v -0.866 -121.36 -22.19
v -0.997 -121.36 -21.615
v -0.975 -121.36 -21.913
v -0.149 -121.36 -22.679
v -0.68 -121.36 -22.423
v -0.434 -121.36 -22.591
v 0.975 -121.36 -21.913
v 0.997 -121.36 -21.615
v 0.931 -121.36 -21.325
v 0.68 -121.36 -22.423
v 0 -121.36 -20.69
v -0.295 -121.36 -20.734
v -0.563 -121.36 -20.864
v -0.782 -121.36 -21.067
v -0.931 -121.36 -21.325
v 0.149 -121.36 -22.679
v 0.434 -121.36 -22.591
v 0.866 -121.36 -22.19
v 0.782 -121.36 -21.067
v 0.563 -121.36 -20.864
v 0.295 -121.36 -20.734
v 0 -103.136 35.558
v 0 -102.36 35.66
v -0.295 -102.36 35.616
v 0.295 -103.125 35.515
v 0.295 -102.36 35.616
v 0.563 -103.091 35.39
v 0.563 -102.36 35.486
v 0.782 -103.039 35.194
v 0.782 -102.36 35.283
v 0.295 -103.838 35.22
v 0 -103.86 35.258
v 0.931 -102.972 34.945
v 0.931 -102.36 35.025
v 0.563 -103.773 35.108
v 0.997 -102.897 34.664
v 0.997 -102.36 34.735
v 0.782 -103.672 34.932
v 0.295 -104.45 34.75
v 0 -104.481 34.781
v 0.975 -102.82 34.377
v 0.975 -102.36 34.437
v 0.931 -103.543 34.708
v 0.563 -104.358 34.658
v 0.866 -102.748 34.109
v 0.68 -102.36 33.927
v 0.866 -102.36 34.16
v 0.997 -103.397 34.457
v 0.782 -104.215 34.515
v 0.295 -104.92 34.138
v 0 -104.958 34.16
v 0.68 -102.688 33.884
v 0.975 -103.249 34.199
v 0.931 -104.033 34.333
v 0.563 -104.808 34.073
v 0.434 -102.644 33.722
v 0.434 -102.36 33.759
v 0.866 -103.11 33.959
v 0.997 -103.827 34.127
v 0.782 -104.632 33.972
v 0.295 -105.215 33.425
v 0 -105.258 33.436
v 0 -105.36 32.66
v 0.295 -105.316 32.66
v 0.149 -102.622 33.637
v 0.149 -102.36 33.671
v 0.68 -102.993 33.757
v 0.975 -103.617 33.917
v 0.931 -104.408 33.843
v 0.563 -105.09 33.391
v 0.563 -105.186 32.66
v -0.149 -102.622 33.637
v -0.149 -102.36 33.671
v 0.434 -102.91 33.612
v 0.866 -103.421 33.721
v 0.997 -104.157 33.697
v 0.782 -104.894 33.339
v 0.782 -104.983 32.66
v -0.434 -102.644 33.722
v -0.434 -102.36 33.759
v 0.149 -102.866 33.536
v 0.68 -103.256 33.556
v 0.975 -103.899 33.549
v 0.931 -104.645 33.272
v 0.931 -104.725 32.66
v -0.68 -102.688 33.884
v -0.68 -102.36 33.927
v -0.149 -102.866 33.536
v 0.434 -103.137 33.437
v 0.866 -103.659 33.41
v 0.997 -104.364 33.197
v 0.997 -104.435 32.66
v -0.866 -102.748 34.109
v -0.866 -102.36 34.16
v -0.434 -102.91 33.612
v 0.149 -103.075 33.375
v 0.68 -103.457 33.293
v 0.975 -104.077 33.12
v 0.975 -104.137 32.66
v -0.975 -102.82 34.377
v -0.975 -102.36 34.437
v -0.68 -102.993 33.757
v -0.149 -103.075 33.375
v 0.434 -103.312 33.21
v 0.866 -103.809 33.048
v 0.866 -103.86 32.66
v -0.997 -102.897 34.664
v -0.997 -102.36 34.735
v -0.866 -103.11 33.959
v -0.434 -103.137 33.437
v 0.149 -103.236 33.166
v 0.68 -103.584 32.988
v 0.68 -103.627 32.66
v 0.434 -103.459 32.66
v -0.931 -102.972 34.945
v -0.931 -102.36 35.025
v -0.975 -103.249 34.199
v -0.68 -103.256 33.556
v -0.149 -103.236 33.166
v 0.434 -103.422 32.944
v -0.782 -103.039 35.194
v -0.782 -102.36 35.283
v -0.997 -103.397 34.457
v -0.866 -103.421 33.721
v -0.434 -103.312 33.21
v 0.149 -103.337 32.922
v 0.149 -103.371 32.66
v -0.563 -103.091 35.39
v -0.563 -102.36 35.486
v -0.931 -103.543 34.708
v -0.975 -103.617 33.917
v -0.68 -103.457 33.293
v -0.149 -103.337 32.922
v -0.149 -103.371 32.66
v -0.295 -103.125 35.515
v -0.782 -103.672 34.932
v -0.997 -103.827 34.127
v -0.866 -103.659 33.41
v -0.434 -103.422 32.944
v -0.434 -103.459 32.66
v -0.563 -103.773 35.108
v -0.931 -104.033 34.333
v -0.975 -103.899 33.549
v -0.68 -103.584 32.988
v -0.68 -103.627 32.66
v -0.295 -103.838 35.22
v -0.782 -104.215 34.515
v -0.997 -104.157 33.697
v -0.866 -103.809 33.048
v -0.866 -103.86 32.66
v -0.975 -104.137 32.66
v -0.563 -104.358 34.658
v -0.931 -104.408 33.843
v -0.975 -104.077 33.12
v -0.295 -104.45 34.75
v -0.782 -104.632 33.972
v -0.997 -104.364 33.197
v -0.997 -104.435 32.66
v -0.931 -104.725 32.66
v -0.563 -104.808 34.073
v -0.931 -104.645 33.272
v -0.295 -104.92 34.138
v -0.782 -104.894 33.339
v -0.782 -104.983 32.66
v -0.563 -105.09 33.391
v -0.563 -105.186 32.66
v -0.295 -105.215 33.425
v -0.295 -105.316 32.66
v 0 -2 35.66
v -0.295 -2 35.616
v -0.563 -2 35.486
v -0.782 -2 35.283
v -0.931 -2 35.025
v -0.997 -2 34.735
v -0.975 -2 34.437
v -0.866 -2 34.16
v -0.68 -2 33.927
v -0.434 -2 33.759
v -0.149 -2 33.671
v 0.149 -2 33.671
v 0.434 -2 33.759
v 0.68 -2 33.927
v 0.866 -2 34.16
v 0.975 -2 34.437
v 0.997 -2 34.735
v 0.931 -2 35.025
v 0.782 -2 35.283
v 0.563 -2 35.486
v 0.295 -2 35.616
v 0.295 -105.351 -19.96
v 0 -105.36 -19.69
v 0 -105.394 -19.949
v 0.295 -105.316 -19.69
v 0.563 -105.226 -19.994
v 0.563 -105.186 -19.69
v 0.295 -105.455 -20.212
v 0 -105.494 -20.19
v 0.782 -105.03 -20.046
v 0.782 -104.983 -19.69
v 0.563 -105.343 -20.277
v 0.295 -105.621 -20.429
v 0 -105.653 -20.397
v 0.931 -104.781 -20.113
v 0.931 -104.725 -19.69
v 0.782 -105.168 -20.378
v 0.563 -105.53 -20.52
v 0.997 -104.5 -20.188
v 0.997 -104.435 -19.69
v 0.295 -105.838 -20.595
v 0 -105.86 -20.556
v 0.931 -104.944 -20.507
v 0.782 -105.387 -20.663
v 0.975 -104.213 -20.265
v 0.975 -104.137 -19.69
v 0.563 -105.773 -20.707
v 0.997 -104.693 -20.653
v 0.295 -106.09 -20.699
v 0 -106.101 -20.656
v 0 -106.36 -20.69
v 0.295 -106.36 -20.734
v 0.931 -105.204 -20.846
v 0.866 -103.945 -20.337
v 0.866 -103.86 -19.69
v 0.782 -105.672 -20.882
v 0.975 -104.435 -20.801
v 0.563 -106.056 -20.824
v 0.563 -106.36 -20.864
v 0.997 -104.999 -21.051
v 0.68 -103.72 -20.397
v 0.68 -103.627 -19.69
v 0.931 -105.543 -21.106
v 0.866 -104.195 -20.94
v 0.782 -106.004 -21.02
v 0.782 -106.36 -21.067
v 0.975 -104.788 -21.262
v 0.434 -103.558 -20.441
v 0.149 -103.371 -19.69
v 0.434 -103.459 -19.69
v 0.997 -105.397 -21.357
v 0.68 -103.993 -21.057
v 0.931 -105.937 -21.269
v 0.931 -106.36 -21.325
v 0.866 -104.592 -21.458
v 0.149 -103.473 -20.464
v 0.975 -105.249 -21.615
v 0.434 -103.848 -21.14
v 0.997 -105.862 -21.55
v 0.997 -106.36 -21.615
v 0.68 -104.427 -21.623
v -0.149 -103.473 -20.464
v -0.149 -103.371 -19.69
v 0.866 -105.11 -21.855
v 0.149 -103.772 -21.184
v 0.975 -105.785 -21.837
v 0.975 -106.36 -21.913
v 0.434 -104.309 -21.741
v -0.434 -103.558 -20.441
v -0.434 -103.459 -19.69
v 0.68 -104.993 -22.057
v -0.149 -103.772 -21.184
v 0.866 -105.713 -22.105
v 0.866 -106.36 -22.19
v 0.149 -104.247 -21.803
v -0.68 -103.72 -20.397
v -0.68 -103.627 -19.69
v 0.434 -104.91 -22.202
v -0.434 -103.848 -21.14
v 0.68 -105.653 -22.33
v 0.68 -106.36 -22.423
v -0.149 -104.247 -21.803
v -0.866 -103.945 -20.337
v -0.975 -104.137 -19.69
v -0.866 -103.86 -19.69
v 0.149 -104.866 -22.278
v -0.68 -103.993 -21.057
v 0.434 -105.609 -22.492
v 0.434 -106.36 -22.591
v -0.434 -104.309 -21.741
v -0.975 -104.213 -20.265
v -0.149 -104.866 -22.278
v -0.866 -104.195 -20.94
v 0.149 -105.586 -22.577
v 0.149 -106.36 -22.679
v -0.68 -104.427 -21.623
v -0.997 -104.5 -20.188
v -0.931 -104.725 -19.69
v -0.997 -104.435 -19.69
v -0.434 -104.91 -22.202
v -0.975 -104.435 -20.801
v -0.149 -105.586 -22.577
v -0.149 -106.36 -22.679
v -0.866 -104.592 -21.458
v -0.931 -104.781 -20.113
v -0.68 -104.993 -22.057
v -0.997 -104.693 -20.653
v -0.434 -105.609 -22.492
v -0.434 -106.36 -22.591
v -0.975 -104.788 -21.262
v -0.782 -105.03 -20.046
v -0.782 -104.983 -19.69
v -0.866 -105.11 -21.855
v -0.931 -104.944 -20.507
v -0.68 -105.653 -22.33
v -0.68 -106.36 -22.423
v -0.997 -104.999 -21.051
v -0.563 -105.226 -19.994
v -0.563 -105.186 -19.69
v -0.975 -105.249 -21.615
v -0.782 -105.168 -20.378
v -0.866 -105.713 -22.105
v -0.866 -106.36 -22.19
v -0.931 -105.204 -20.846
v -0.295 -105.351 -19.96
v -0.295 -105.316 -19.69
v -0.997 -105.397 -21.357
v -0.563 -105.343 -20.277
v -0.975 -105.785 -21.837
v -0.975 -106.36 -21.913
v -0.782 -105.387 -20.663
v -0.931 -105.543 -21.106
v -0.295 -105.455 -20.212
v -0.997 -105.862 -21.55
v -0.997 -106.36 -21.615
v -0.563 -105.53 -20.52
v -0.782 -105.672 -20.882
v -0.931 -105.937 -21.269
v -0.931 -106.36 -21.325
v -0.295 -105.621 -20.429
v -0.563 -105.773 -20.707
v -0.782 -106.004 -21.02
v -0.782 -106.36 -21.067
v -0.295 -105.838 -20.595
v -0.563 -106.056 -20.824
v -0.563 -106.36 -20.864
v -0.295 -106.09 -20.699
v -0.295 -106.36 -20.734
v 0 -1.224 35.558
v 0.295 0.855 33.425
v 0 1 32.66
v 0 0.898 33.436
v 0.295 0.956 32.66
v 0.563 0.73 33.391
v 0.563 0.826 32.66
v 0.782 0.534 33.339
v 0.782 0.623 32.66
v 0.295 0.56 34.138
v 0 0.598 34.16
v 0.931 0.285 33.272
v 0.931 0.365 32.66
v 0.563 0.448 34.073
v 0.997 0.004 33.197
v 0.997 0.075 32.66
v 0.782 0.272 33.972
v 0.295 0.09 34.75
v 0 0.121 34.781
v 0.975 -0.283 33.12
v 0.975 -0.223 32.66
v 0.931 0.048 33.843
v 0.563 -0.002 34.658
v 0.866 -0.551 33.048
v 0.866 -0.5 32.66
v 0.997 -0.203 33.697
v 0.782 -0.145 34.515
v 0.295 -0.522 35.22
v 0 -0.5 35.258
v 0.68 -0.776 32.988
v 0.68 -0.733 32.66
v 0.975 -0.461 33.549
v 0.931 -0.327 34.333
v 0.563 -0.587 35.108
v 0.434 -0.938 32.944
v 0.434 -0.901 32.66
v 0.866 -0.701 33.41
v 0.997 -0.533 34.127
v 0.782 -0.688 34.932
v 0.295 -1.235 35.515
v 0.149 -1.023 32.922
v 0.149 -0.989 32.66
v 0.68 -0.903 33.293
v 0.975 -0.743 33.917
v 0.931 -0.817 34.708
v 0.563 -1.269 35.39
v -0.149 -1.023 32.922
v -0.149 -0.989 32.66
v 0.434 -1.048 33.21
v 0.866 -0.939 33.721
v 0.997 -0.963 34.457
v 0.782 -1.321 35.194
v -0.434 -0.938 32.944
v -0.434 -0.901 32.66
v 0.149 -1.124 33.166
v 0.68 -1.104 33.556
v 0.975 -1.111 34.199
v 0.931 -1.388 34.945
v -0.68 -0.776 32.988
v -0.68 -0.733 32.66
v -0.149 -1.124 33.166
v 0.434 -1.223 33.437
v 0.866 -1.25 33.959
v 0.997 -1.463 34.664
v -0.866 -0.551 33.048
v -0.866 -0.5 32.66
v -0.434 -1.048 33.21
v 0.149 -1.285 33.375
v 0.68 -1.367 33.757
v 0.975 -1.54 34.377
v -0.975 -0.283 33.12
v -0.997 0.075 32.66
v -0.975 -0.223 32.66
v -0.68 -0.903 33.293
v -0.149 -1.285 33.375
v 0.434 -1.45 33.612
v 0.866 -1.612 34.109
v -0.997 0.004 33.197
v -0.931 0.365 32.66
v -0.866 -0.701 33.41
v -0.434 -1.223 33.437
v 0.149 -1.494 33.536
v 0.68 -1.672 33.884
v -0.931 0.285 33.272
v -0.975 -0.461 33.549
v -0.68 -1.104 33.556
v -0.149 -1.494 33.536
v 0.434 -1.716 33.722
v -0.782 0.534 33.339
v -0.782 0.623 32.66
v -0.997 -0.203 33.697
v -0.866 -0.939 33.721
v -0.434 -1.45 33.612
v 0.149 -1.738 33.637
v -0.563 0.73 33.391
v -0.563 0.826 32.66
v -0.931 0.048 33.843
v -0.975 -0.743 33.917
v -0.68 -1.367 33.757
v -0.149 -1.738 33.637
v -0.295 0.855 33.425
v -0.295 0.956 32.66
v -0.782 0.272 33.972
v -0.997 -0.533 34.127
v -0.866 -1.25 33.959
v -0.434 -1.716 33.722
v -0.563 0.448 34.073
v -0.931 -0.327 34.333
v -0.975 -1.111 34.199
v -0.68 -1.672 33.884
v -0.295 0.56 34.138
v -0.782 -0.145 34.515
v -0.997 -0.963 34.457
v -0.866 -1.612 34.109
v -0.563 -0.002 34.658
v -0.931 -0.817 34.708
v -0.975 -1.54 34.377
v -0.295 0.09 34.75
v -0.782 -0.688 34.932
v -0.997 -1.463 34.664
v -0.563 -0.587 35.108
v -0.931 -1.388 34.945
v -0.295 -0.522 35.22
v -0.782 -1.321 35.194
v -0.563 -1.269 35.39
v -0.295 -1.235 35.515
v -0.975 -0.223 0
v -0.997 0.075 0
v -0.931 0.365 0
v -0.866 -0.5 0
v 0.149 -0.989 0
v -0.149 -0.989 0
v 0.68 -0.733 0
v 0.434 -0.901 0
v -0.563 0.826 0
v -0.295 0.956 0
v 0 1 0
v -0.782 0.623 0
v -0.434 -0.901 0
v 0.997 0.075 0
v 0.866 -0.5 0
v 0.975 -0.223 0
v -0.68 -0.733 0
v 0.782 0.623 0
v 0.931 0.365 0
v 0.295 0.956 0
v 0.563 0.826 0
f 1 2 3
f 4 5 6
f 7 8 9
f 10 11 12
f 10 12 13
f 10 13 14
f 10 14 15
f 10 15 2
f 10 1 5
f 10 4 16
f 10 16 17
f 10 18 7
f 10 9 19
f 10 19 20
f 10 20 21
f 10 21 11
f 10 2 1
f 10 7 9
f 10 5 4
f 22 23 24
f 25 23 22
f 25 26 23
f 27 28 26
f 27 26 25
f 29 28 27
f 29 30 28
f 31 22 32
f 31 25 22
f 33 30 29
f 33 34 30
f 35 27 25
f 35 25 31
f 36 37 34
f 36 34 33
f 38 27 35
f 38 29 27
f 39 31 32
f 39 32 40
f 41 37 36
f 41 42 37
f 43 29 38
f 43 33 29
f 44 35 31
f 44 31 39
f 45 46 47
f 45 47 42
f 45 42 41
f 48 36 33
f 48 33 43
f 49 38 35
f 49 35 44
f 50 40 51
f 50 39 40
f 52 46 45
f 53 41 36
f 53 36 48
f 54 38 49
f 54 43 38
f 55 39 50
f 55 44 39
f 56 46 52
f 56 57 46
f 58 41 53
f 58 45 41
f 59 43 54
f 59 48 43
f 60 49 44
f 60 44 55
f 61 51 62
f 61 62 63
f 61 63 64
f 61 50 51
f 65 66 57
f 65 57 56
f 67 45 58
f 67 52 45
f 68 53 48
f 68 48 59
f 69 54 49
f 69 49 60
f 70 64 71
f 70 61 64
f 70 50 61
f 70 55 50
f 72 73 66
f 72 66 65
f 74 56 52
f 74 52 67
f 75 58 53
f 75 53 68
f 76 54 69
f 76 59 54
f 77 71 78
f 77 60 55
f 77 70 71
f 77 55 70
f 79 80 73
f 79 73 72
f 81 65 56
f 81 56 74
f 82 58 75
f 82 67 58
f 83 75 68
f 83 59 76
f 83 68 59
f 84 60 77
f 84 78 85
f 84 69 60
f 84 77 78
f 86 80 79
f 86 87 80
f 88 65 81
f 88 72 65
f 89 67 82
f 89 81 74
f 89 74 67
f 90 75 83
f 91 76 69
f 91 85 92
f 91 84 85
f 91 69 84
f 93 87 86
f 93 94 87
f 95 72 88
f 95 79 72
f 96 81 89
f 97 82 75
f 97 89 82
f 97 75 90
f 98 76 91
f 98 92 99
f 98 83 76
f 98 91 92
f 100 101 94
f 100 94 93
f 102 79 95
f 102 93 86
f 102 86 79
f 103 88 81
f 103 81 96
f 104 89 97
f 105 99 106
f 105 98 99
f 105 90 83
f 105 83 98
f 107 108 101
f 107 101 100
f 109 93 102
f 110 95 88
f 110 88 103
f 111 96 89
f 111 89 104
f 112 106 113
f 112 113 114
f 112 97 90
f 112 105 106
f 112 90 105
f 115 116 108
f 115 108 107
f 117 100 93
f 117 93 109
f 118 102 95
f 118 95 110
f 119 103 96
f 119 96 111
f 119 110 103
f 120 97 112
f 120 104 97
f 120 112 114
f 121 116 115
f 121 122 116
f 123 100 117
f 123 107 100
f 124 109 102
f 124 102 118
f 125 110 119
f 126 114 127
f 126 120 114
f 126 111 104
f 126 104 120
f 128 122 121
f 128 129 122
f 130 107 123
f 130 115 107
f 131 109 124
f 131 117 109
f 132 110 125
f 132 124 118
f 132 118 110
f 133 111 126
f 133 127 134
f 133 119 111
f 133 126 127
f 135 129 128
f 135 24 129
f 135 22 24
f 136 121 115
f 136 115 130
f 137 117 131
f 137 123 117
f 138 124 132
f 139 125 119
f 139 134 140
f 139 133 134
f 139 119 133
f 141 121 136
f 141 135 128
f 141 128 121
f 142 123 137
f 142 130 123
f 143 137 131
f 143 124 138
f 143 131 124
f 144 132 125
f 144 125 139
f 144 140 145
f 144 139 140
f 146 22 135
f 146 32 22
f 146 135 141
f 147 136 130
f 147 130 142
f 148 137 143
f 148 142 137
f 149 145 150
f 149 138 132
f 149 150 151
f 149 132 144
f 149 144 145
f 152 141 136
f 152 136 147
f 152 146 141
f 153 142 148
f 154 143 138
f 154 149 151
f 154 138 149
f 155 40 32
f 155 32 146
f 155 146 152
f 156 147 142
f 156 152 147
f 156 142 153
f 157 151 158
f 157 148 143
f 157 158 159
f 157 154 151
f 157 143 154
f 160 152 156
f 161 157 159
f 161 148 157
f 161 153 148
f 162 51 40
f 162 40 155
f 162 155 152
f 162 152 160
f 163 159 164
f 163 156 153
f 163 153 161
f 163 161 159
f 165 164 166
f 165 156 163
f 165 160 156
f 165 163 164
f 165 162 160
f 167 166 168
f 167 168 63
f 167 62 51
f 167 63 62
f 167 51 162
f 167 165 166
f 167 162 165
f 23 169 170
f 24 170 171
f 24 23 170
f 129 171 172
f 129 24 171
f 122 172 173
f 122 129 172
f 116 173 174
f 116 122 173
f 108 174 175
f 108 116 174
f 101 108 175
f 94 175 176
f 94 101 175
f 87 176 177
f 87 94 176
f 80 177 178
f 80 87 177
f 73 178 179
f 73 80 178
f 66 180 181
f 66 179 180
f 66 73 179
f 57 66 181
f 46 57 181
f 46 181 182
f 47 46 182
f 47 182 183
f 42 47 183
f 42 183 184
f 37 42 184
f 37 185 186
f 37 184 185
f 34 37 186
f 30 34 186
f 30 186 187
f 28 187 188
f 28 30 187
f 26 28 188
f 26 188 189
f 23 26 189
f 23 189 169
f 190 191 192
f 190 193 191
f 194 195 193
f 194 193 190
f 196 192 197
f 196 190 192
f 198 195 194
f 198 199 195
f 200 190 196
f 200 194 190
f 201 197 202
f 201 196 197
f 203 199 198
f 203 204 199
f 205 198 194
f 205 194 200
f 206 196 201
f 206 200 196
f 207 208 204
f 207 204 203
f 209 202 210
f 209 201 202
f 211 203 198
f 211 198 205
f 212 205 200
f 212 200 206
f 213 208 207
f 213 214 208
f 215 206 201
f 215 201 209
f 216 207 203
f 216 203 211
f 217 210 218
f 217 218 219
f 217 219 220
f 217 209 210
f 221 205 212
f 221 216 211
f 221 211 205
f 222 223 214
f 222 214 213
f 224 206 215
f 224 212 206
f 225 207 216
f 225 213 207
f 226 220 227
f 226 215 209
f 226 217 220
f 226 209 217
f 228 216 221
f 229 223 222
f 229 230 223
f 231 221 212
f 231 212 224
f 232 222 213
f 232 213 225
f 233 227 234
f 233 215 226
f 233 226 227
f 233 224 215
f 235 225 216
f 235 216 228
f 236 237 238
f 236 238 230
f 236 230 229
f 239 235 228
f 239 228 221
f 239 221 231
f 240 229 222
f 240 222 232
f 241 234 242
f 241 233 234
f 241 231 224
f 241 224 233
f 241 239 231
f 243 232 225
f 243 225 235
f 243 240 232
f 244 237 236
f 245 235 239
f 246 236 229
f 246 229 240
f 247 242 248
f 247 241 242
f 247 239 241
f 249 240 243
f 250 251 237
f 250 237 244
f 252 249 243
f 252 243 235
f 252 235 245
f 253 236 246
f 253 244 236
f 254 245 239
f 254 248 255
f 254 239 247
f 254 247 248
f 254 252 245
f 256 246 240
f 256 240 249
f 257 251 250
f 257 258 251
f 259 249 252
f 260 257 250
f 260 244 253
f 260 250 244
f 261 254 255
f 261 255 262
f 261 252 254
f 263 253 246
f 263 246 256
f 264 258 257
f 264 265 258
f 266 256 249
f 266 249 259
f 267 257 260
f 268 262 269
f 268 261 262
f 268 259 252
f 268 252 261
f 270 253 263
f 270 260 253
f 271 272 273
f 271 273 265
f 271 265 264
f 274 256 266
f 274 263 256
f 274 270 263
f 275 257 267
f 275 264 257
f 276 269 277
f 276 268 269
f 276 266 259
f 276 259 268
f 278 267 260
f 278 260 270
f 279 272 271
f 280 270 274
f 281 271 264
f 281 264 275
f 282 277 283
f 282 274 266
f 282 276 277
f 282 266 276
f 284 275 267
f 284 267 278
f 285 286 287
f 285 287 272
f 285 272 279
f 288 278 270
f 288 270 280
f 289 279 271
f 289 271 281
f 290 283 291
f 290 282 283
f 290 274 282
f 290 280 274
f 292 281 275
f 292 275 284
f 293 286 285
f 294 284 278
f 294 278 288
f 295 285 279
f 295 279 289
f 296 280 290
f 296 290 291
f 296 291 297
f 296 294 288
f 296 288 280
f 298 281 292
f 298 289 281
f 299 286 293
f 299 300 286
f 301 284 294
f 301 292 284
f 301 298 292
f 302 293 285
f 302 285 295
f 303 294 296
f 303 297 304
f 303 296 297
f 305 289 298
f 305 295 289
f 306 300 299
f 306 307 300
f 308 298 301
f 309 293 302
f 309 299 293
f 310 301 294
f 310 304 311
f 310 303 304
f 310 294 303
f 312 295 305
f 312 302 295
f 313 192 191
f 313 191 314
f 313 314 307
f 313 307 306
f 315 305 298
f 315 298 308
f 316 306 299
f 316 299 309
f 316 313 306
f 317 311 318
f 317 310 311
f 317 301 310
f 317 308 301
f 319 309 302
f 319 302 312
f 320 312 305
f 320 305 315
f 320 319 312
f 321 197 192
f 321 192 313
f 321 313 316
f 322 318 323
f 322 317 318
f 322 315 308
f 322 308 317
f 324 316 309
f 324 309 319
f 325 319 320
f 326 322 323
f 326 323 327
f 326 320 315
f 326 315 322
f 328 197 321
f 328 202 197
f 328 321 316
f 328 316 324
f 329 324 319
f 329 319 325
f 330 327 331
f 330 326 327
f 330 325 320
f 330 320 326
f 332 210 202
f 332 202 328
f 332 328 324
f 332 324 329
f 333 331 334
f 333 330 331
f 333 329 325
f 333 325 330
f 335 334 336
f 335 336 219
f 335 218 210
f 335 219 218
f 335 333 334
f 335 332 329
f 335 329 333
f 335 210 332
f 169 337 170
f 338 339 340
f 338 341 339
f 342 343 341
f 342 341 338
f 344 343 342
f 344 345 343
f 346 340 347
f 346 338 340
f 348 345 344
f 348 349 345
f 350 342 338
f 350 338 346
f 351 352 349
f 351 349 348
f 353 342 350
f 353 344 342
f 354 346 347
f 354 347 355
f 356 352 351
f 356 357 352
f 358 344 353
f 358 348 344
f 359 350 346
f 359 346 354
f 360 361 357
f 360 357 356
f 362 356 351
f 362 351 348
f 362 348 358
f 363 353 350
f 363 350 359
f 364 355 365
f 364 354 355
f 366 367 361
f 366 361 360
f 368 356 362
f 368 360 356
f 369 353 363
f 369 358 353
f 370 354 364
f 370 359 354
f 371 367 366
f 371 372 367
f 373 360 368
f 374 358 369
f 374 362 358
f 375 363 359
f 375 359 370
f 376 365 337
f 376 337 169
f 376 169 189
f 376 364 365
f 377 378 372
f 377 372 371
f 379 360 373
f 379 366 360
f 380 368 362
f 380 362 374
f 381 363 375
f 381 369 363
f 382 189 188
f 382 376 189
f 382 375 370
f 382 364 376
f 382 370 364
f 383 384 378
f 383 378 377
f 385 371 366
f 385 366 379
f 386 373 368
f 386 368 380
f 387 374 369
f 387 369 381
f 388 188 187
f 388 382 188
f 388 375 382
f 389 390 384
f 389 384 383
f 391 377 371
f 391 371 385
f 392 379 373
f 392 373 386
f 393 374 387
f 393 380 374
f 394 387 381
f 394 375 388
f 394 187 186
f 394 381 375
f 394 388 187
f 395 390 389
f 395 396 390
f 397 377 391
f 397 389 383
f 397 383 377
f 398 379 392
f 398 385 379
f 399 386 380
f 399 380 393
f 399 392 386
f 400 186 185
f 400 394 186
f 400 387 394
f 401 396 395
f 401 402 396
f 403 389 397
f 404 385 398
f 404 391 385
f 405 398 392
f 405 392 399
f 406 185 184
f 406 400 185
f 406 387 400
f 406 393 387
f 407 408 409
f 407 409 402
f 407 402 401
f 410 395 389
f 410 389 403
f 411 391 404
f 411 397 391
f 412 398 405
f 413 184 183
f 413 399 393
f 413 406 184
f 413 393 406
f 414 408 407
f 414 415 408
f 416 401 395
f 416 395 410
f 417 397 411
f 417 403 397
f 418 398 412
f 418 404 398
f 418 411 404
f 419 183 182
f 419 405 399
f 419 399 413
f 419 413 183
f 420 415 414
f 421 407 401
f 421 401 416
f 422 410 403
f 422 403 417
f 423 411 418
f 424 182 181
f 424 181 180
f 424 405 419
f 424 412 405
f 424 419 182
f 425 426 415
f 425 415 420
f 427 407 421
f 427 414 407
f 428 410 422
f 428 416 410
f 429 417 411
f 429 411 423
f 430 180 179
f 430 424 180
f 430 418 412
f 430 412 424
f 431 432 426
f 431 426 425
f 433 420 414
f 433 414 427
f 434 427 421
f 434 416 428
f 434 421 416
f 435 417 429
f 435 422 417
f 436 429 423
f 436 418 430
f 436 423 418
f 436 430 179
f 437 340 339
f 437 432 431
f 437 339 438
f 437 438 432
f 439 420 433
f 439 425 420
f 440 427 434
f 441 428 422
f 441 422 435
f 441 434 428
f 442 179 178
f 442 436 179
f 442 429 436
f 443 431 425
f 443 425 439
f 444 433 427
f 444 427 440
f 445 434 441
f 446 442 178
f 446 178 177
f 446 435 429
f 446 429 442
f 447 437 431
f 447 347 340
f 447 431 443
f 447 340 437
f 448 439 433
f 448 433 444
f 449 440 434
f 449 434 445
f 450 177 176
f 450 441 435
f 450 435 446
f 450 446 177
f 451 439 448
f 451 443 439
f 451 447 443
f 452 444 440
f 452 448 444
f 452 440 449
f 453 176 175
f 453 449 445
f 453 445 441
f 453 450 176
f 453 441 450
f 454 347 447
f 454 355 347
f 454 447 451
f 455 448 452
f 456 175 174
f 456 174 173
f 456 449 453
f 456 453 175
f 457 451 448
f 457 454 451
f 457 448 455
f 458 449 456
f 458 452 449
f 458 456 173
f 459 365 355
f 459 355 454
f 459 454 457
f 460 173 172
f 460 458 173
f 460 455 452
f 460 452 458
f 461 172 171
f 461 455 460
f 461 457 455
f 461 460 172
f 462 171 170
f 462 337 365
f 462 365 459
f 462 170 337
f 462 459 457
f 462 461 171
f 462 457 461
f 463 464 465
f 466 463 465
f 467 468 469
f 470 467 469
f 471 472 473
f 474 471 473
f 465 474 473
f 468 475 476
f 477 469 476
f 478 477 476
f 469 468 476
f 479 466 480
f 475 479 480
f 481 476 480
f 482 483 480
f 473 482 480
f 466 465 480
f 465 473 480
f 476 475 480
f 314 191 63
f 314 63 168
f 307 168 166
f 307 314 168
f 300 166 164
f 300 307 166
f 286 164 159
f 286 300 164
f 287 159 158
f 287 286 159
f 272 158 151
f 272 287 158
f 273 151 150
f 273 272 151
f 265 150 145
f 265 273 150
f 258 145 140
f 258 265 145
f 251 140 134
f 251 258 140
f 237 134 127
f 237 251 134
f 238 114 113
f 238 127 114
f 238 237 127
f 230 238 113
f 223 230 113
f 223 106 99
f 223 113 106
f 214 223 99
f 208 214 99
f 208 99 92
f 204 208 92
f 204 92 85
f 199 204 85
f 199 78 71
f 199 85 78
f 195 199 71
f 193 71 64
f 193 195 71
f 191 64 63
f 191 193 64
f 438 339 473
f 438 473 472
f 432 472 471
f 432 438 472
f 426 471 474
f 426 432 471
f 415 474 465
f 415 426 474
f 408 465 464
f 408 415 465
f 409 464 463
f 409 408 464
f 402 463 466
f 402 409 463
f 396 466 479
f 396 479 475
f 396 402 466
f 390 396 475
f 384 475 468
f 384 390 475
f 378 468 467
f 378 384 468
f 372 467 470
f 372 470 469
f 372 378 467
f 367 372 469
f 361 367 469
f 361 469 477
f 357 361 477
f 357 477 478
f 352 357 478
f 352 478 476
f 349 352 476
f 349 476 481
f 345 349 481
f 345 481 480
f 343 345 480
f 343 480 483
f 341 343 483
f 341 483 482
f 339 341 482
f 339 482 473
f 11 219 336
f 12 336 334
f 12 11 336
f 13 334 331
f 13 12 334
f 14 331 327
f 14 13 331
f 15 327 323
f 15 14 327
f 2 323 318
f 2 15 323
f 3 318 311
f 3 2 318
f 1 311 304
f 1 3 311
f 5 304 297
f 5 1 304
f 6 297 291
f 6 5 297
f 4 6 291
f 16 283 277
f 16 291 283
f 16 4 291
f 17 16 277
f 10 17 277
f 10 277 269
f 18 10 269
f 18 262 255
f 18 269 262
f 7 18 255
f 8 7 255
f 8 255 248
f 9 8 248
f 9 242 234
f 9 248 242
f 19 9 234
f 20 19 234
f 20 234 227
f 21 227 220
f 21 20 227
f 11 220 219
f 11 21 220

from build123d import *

# Parameters (mm, degrees)
BARRER1_PROFILE_R = 1


with BuildPart() as part:
    # Barrer1: sweep along a path in Croquis1
    with BuildLine(Plane(origin=(0, 0, 0), x_dir=(0, 0, -1), z_dir=(1, 0, 0))) as barrer1_path:
        Line((0, 0), (-32.66, 0))
        ThreePointArc((-32.66, 0), (-34.074213562, -0.585786438), (-34.66, -2))
        Line((-34.66, -2), (-34.66, -102.36))
        ThreePointArc((-34.66, -102.36), (-34.074213562, -103.774213562), (-32.66, -104.36))
        Line((-32.66, -104.36), (19.69, -104.36))
        ThreePointArc((19.69, -104.36), (21.104213562, -104.945786438), (21.69, -106.36))
        Line((21.69, -106.36), (21.69, -121.36))
    # Barrer1 profile (on start of the path) → Barrer1 (sweep)
    with BuildSketch(Plane(origin=(0, 0, 0), x_dir=(0, 1, 0), z_dir=(0, 0, 1))):
        Circle(BARRER1_PROFILE_R)
    sweep(path=barrer1_path.line)


solid = part.part
